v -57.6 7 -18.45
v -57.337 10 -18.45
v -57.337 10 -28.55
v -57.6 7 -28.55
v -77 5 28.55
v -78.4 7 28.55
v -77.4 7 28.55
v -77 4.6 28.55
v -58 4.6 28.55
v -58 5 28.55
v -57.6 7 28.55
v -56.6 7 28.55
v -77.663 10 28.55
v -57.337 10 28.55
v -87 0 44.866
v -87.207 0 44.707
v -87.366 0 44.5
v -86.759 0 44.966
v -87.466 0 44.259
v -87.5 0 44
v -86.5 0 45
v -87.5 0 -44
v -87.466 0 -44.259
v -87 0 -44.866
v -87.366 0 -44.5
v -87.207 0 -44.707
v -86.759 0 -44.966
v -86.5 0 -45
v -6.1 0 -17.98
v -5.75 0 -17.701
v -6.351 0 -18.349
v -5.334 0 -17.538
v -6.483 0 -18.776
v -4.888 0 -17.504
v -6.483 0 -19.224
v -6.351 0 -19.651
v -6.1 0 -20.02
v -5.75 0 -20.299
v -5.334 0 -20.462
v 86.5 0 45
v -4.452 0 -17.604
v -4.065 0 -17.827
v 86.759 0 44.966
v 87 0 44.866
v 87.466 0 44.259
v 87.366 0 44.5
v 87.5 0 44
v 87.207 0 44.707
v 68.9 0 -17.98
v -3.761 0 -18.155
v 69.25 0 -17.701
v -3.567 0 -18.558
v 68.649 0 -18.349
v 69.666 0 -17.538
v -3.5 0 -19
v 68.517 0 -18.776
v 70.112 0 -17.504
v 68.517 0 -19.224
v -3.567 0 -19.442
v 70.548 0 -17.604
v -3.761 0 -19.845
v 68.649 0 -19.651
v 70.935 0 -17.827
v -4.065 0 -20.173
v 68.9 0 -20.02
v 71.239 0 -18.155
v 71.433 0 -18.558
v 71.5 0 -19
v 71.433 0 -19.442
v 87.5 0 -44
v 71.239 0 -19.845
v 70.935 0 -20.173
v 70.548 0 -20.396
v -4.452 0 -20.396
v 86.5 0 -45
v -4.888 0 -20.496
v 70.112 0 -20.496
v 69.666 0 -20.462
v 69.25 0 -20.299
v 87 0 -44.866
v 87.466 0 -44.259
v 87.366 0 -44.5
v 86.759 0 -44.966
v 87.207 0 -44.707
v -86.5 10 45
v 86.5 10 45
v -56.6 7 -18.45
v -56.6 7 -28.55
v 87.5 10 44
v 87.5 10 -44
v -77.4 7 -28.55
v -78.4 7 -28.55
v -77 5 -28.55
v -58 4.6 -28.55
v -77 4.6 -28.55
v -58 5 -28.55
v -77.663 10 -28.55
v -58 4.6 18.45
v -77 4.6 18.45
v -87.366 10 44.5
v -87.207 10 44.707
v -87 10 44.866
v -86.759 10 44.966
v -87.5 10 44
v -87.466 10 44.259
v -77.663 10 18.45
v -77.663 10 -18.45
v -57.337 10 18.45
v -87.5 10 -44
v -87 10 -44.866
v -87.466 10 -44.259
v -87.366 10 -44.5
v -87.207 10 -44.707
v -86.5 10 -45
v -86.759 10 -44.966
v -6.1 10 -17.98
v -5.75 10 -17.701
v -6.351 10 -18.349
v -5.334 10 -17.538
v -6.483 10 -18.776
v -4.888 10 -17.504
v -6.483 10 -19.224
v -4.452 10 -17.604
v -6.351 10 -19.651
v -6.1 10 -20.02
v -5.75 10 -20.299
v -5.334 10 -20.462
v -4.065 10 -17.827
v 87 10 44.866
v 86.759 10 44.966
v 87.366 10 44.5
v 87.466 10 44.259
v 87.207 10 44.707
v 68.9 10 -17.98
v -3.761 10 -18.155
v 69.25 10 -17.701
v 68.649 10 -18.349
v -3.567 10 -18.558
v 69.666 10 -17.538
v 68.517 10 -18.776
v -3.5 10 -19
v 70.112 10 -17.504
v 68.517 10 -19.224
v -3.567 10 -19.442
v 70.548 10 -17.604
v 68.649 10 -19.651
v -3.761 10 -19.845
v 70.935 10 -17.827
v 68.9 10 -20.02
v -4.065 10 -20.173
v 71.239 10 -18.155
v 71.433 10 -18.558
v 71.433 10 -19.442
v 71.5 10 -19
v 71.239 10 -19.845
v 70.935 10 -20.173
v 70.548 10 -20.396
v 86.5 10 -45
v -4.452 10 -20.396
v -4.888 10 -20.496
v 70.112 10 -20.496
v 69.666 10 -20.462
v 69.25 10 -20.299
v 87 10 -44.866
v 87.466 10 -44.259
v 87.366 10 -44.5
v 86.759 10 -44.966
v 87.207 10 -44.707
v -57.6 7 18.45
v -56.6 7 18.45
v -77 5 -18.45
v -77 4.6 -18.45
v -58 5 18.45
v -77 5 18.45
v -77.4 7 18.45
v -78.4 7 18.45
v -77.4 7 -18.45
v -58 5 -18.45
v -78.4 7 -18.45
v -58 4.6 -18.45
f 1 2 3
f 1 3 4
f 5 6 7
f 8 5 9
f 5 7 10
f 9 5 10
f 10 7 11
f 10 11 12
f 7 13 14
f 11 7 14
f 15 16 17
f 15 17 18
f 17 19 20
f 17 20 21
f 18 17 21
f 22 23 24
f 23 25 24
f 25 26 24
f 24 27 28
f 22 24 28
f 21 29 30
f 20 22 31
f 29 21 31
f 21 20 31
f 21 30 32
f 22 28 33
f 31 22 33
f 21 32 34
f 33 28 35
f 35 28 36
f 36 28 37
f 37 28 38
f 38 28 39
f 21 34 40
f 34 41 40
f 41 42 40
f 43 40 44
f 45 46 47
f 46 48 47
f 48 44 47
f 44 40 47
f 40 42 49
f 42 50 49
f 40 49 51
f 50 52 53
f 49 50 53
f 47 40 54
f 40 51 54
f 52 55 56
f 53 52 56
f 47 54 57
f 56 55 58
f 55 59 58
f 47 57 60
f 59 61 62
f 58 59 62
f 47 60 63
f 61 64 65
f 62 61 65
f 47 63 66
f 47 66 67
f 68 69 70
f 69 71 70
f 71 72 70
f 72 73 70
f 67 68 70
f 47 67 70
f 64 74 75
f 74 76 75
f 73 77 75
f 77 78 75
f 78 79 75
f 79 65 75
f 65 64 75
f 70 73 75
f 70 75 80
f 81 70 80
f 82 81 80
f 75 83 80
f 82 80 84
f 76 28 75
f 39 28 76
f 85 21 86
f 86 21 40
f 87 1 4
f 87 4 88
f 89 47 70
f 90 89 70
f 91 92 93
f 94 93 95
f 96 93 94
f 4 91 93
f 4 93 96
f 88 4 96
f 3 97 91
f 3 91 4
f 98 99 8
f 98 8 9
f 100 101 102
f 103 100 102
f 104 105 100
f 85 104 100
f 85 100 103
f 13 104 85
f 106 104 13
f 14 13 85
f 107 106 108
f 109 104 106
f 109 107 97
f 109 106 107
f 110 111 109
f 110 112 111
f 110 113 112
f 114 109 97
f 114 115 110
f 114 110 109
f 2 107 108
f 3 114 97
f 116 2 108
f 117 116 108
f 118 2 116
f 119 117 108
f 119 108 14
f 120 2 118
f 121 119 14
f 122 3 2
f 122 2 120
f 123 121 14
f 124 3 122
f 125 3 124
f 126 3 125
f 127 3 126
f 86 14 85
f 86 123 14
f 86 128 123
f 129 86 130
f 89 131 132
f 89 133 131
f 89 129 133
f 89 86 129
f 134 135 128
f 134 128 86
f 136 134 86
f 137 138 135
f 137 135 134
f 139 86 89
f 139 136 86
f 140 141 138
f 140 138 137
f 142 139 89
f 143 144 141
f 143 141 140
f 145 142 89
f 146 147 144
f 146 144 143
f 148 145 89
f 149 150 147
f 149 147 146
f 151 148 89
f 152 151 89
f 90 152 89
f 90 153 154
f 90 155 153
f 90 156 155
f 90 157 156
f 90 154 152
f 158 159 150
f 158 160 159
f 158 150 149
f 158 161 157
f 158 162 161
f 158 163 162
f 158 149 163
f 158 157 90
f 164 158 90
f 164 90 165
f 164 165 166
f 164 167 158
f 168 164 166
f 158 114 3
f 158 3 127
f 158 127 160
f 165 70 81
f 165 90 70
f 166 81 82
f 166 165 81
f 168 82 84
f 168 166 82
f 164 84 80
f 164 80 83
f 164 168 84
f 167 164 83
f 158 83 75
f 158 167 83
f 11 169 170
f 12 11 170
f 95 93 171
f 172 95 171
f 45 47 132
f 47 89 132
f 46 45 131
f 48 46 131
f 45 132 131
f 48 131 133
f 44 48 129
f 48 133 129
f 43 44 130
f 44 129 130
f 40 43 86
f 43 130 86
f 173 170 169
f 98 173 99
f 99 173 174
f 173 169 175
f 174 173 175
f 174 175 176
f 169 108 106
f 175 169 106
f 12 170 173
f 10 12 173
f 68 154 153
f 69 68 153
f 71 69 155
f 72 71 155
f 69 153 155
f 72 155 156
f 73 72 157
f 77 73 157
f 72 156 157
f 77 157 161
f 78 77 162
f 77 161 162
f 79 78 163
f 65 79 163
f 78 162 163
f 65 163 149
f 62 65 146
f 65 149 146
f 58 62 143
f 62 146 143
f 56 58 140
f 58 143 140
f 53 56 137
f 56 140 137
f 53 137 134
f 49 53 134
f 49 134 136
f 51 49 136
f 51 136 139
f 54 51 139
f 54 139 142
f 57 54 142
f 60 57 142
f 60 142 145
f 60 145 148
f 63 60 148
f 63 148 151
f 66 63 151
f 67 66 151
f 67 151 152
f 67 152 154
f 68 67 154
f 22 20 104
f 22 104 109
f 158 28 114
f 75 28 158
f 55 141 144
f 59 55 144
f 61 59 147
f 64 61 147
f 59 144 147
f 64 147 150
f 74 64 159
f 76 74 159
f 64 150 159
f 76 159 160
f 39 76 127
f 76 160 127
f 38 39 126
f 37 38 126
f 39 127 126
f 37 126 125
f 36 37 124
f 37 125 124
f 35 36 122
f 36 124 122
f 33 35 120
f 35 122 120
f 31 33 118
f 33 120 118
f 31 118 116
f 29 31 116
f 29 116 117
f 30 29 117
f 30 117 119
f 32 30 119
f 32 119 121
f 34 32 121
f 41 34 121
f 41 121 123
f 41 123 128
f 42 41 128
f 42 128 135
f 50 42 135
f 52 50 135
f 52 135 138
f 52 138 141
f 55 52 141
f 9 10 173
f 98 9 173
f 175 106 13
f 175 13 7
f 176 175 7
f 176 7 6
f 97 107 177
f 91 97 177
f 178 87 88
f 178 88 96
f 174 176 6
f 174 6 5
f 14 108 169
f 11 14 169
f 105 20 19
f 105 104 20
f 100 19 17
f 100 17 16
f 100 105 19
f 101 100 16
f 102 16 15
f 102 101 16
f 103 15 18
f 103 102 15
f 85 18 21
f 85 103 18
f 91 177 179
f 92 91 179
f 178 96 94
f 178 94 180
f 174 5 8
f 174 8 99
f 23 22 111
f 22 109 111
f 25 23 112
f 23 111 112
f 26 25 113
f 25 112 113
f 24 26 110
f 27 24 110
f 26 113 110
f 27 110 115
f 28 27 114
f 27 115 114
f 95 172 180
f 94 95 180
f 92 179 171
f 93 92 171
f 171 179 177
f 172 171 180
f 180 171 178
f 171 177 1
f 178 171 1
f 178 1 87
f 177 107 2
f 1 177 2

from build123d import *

# Parameters (mm, degrees)
SKETCH1_W           = 175
SKETCH1_H           = 90
BOSS_EXTRUDE1_DEPTH = 10
SKETCH2_W           = 19
SKETCH2_H           = 10.1
CUT_EXTRUDE1_DEPTH  = 5.4
CUT_EXTRUDE2_DEPTH  = 10.1
FILLET1_R           = 1
SKETCH2_8_R         = 1.5
CUT_EXTRUDE3_DEPTH  = 11


with BuildPart() as part:
    # Sketch1 → Boss-Extrude1 (new body)
    with BuildSketch(Plane(origin=(0, 0, 0), x_dir=(1, 0, 0), z_dir=(0, 1, 0))):
        Rectangle(SKETCH1_W, SKETCH1_H)
    extrude(amount=BOSS_EXTRUDE1_DEPTH)

    # Sketch2 → Cut-Extrude1 (cut)
    with BuildSketch(Plane(origin=(0, 10, 0), x_dir=(1, 0, 0), z_dir=(0, 1, 0))):
        with Locations((-67.5, -23.5)):
            Rectangle(SKETCH2_W, SKETCH2_H)
    cut_extrude1 = extrude(amount=-CUT_EXTRUDE1_DEPTH, mode=Mode.SUBTRACT)

    # Sketch7 → Cut-Extrude2 (cut)
    with BuildSketch(Plane.XY.offset(18.45)):
        Polygon((-77, 5), (-77, 10), (-77.662881067, 10), (-77.400415076, 7), (-78.400415076, 7), align=None)
        Polygon((-58, 5), (-58, 10), (-57.337118933, 10), (-57.599584924, 7), (-56.599584924, 7), align=None)
    cut_extrude2 = extrude(amount=CUT_EXTRUDE2_DEPTH, mode=Mode.SUBTRACT)

    # Mirror1: Cut-Extrude1, Cut-Extrude2 across plane
    add(cut_extrude1.mirror(Plane.XY), mode=Mode.SUBTRACT)
    add(cut_extrude2.mirror(Plane.XY), mode=Mode.SUBTRACT)

    # Fillet1
    fillet1_edges = [part.edges().sort_by_distance(p)[0] for p in [
        (-87.5, 5, -45),
        (87.5, 5, -45),
        (87.5, 5, 45),
        (-87.5, 5, 45),
    ]]
    fillet(fillet1_edges, radius=FILLET1_R)

    # Sketch2<8> → Cut-Extrude3 (cut, through all)
    with BuildSketch(Plane(origin=(0, 10, 0), x_dir=(1, 0, 0), z_dir=(0, 1, 0))):
        with Locations((-5, 19)):
            Circle(SKETCH2_8_R)
        with Locations((70, 19)):
            Circle(SKETCH2_8_R)
    extrude(amount=-CUT_EXTRUDE3_DEPTH, mode=Mode.SUBTRACT)


solid = part.part
